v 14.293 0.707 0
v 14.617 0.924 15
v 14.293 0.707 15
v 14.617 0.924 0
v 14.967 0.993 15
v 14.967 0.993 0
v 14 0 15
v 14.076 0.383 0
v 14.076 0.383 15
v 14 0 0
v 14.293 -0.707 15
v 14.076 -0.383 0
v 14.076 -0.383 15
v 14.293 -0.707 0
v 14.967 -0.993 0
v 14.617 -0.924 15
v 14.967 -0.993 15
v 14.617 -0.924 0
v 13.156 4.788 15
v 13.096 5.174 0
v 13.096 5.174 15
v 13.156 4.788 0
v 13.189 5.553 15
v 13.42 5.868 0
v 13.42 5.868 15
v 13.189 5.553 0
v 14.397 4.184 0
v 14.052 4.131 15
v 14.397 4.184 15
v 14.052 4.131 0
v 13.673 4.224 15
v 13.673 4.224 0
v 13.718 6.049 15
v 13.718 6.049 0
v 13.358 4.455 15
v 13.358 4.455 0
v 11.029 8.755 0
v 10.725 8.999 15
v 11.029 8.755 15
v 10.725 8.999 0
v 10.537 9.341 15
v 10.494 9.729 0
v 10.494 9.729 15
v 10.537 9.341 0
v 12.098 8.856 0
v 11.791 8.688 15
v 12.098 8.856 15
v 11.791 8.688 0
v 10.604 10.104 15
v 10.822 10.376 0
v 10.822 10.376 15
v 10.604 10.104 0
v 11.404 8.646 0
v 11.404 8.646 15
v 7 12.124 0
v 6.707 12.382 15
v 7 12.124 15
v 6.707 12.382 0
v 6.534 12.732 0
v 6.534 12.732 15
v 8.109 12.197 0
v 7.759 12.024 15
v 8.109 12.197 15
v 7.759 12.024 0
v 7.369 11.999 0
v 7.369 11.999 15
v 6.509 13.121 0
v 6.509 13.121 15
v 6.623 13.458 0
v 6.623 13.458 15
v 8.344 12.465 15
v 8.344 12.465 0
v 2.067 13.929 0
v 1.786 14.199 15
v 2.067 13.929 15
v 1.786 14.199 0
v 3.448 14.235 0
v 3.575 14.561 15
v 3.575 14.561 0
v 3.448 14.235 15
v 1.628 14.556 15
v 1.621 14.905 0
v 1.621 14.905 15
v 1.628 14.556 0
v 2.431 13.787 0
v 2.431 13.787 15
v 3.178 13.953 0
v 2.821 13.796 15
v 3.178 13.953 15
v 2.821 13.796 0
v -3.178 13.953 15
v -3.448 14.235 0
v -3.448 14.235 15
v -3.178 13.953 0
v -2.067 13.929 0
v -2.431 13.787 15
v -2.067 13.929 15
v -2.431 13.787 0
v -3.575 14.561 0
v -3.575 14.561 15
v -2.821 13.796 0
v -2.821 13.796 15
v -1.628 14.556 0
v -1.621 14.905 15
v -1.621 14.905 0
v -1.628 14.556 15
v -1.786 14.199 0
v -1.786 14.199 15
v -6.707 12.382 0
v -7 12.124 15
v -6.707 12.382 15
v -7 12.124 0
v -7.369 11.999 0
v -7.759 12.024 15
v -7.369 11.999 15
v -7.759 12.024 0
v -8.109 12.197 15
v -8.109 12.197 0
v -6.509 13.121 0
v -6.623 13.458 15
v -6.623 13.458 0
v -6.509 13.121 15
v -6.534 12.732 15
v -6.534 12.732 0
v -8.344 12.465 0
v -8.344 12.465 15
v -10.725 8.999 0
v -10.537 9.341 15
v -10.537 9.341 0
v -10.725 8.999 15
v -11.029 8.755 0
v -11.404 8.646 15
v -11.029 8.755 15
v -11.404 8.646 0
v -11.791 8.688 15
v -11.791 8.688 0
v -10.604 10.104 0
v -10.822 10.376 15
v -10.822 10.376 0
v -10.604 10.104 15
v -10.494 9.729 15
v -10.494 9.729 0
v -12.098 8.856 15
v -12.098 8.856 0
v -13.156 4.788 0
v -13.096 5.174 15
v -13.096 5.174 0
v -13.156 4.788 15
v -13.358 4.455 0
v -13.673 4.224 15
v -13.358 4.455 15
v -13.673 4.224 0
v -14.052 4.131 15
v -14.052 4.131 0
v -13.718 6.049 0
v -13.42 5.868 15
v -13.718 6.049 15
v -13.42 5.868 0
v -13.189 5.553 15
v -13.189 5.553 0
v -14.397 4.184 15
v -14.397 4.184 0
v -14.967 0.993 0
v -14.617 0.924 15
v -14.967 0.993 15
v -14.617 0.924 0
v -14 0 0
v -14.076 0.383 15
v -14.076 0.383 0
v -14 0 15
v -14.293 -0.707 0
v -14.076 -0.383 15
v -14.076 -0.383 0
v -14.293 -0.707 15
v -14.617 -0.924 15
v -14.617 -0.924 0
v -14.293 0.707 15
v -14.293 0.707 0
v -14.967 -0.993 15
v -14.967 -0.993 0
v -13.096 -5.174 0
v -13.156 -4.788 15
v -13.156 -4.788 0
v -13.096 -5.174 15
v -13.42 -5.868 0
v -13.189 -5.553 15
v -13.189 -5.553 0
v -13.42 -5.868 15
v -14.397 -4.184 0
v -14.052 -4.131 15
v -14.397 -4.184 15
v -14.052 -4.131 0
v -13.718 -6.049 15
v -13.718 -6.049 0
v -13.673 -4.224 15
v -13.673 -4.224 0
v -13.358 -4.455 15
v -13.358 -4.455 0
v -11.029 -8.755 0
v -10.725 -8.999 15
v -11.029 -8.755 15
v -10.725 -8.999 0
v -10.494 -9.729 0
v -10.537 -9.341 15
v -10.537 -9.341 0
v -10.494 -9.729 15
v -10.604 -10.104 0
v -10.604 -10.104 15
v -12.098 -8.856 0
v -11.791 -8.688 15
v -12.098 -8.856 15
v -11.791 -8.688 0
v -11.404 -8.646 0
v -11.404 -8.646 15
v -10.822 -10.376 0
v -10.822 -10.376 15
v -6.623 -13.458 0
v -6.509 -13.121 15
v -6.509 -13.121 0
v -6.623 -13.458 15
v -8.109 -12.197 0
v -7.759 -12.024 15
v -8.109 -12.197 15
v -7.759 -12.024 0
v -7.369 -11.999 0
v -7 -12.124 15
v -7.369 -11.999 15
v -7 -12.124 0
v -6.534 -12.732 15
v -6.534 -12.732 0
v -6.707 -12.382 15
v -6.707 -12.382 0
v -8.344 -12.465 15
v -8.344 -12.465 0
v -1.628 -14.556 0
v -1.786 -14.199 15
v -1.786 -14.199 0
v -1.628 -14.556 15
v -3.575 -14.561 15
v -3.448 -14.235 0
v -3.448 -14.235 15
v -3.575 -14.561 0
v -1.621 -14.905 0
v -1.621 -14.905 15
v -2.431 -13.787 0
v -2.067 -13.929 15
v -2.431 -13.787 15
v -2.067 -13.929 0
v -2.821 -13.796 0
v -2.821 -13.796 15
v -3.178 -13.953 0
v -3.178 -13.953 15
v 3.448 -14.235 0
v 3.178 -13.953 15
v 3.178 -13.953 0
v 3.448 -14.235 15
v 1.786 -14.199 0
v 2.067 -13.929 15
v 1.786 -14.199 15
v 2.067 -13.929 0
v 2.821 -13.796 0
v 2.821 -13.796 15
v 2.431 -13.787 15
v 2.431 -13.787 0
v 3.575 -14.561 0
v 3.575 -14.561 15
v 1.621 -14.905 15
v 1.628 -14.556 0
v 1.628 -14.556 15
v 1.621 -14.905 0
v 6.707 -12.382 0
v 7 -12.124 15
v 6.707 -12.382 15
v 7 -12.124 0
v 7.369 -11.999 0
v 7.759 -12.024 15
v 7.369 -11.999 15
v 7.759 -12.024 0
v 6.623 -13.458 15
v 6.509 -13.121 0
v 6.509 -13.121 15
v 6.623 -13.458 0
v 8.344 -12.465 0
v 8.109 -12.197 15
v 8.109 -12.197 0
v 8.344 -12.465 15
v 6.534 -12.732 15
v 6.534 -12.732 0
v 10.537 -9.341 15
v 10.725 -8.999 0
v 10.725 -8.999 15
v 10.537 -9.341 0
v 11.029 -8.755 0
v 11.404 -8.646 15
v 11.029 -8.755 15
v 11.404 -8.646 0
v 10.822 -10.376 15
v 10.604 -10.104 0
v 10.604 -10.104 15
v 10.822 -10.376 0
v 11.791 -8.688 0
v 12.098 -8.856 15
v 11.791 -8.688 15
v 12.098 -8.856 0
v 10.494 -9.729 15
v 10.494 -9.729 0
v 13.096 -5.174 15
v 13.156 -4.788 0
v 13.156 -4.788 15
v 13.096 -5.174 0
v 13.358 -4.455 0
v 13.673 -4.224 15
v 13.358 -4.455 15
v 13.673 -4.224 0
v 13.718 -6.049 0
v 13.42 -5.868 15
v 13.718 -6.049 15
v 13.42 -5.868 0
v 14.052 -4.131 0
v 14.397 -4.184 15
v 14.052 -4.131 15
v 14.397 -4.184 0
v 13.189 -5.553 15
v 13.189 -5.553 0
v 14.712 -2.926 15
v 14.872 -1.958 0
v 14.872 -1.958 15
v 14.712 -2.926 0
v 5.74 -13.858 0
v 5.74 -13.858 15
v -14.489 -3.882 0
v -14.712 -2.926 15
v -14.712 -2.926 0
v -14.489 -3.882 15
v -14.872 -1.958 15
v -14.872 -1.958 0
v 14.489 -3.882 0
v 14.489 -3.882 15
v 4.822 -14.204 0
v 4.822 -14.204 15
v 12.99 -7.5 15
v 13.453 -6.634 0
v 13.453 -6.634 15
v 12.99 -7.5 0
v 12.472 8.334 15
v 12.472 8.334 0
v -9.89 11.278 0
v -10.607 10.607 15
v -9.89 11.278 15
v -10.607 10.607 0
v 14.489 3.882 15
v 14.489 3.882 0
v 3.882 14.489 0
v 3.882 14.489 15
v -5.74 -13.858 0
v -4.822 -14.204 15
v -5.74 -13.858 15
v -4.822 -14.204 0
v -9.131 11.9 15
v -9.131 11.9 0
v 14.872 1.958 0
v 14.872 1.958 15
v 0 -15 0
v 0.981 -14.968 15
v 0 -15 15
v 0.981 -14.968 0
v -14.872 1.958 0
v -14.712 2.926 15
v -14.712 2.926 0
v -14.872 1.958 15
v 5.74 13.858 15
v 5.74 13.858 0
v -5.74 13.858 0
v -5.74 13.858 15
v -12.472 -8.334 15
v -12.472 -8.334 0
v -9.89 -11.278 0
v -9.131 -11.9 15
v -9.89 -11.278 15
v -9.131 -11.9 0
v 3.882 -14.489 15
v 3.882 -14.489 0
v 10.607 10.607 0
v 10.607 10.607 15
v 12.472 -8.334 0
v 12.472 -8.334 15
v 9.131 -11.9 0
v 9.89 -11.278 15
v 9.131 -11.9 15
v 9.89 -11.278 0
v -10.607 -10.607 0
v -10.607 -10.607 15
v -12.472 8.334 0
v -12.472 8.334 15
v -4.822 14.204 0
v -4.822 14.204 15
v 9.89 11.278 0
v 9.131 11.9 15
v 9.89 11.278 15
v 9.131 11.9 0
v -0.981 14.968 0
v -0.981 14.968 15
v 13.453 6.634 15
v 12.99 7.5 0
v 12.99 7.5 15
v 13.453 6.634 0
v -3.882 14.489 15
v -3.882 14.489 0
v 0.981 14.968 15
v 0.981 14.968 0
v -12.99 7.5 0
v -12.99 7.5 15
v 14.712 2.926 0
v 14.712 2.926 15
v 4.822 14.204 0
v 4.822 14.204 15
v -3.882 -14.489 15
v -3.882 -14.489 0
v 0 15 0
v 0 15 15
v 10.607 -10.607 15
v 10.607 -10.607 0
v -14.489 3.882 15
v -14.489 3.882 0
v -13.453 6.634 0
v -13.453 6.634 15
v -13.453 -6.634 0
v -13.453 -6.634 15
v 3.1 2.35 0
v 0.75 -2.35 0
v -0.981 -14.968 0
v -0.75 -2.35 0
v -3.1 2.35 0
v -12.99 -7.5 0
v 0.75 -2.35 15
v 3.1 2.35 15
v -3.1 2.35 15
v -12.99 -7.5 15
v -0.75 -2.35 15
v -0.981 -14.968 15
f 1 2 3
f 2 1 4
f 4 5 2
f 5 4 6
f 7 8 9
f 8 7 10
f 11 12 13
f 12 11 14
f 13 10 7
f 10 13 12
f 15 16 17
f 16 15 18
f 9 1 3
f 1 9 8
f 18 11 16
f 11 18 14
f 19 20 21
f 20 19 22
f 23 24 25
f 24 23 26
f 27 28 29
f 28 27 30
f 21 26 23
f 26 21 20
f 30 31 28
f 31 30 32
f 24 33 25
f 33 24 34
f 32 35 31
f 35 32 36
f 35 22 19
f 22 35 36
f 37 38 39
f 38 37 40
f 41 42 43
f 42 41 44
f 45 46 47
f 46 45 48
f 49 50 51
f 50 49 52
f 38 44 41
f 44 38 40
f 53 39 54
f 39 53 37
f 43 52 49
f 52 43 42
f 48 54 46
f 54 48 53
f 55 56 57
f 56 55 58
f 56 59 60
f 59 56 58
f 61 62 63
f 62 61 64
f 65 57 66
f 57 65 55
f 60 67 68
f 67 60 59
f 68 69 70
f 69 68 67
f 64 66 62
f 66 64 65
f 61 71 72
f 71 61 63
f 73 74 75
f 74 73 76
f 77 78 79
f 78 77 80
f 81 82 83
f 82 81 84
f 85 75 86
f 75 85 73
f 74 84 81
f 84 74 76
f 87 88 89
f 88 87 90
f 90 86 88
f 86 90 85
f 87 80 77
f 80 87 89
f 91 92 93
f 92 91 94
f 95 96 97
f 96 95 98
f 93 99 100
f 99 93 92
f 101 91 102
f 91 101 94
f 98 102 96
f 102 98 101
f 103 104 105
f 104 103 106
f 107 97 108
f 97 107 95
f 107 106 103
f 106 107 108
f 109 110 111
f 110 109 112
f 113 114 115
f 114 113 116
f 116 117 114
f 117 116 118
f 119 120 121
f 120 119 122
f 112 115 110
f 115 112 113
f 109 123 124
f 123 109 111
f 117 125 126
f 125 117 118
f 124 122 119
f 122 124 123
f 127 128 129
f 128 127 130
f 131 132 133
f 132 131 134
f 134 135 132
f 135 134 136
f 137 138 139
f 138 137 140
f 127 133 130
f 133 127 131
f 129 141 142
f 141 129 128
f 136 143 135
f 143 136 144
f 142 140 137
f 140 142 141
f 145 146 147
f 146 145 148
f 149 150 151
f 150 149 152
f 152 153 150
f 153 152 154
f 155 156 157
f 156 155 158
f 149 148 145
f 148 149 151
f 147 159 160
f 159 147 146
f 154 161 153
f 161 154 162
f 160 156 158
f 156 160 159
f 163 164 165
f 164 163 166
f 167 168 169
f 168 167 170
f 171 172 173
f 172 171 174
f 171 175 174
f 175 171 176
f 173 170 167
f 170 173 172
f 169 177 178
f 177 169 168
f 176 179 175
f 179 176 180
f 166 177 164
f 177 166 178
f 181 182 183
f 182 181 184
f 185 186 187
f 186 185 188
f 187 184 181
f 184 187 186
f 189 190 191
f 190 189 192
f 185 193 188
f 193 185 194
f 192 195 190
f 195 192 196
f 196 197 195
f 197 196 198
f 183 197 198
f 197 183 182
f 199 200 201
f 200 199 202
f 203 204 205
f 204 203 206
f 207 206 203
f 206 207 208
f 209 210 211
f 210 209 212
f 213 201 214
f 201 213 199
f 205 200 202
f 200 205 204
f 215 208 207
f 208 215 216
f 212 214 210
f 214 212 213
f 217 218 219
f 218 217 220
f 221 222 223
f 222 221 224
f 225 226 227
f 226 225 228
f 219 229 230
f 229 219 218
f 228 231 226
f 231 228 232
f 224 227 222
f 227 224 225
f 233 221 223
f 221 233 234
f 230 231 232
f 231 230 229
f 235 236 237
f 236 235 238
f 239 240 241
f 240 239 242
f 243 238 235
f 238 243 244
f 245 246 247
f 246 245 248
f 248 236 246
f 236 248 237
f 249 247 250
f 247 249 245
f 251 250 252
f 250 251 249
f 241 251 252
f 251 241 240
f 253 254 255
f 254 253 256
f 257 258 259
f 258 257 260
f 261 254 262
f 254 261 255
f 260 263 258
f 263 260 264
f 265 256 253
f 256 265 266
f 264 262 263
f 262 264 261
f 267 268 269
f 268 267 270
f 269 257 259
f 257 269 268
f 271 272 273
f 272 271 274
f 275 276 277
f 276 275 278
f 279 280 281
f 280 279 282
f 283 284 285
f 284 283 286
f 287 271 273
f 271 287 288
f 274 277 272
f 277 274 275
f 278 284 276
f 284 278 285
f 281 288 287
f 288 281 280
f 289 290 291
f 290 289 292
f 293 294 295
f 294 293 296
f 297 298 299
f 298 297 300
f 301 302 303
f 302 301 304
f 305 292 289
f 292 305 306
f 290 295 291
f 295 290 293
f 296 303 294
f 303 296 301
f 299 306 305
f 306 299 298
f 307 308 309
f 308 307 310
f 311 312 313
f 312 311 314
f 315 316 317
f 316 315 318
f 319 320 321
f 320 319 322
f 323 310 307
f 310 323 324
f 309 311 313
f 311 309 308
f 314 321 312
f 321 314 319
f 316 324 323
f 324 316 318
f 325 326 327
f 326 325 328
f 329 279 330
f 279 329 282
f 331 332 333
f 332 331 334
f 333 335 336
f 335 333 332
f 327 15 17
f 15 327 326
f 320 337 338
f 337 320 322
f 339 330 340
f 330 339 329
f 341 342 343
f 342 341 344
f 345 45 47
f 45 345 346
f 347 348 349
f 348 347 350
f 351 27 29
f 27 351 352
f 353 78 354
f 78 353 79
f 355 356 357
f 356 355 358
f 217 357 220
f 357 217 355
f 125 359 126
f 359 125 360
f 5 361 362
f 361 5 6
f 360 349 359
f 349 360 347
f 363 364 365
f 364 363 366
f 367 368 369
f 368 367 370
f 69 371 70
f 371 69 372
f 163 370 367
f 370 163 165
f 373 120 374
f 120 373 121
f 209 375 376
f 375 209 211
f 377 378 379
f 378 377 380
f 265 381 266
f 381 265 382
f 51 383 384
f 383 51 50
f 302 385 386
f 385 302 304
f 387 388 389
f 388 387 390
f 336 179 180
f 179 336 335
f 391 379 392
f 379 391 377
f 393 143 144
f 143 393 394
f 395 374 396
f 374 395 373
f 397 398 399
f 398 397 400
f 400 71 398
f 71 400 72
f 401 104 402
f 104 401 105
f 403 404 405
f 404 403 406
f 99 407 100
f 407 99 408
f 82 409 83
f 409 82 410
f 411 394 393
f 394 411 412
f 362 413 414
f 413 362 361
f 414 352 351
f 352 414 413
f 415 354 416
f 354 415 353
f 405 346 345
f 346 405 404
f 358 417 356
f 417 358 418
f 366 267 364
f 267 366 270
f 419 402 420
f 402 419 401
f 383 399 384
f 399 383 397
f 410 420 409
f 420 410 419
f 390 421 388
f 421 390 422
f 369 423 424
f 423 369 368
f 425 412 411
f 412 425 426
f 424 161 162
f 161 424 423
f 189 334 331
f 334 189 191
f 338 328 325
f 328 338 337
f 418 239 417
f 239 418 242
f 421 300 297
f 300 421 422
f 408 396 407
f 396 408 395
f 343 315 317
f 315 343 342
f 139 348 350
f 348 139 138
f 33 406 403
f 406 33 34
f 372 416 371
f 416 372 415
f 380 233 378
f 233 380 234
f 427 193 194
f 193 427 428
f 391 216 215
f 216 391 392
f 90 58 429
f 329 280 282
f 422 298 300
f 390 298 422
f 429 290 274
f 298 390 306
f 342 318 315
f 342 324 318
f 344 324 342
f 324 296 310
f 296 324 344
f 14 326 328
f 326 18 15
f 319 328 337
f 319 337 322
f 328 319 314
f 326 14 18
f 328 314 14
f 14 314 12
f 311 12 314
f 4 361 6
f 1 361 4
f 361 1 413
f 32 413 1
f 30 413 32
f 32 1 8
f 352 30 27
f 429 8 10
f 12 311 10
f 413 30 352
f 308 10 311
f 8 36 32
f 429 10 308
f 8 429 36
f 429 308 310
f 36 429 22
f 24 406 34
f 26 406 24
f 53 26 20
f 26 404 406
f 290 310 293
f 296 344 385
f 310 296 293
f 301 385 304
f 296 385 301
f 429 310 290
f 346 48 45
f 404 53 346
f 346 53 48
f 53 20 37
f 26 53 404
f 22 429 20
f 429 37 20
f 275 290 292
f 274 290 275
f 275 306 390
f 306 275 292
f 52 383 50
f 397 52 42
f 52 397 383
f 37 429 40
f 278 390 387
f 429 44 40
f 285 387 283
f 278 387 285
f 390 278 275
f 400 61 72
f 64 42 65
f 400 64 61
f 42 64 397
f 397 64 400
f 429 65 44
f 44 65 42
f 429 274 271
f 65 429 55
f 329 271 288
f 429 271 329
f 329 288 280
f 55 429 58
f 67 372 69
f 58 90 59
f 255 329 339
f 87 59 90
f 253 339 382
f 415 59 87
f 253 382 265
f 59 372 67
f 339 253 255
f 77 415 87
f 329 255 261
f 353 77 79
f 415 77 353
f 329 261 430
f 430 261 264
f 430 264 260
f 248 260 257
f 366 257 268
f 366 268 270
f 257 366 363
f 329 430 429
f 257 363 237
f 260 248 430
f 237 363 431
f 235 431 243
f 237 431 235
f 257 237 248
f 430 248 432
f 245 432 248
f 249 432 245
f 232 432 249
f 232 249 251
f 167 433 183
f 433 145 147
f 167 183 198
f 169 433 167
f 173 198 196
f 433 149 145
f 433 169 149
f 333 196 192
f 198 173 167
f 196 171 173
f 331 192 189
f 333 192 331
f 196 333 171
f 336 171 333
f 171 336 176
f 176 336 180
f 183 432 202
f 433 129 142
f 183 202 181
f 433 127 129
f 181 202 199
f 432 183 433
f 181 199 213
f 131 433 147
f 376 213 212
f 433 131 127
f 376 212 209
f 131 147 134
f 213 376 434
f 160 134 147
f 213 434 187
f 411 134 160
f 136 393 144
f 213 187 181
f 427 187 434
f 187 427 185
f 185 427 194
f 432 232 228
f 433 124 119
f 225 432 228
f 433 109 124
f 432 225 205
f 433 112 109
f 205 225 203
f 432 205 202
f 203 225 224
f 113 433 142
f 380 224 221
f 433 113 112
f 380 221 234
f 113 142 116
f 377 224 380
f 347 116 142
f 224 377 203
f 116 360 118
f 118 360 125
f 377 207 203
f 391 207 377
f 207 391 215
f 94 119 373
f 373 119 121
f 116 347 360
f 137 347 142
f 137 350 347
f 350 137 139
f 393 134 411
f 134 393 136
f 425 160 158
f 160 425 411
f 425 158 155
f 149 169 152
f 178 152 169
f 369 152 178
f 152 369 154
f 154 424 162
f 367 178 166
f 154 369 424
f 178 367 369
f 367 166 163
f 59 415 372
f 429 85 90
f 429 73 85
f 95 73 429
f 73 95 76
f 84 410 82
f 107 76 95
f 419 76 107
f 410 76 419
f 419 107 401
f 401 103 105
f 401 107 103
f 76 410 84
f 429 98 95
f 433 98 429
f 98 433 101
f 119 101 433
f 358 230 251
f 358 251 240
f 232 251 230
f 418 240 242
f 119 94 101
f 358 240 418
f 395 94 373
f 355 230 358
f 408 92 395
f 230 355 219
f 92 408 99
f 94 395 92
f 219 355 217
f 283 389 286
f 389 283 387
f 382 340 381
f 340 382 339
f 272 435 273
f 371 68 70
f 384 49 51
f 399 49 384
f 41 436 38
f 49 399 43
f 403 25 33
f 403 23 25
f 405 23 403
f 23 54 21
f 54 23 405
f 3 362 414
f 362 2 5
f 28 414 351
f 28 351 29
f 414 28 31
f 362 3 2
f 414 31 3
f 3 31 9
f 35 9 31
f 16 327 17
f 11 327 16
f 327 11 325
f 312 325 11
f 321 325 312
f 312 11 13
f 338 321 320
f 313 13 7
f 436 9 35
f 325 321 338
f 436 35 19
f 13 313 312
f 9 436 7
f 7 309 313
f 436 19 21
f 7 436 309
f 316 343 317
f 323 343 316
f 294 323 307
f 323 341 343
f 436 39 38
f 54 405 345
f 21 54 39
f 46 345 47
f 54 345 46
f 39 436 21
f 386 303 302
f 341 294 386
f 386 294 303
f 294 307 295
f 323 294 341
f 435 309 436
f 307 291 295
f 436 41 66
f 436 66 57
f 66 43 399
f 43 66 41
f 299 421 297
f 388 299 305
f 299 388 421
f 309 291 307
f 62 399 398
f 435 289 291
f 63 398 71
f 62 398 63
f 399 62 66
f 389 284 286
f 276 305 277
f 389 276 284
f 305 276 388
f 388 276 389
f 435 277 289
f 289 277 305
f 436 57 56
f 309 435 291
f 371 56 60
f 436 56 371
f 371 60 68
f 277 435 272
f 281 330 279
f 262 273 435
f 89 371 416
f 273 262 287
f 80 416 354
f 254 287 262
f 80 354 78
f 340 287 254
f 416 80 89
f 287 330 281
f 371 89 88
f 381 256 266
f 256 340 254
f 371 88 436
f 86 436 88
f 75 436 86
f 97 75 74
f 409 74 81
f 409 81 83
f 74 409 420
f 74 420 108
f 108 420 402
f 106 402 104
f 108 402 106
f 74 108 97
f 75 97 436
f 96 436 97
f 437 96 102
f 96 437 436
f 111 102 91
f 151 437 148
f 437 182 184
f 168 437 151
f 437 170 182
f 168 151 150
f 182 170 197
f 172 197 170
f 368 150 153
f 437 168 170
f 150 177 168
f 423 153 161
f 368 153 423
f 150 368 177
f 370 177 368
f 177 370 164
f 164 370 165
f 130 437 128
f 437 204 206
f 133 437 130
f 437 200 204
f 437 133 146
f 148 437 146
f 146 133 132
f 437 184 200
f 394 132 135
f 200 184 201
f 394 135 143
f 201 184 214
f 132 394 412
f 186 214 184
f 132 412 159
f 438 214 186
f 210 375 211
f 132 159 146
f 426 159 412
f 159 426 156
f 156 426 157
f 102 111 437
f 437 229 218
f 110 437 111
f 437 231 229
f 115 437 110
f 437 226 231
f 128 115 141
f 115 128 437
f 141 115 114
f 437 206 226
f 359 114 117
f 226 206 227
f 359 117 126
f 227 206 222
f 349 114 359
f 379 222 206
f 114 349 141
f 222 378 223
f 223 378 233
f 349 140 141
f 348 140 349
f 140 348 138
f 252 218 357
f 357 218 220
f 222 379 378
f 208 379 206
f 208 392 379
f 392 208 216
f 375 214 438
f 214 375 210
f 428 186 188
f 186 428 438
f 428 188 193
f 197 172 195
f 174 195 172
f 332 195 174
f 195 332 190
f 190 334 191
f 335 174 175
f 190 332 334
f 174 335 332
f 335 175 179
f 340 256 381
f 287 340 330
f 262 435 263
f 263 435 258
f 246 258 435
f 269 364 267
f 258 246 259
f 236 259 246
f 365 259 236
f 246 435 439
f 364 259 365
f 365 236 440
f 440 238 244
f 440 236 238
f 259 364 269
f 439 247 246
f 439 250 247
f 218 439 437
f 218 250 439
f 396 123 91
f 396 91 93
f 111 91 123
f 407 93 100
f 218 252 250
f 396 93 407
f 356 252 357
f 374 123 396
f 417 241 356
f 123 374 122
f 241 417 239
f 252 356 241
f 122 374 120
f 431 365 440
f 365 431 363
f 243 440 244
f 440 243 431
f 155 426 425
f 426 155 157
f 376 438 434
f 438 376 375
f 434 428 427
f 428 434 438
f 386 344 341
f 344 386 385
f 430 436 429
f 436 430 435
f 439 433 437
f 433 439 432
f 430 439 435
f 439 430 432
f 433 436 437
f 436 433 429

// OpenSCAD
// Replacement knob for hotplate stirrer (D-shaft 6 mm)
// Print orientation: bottom face (with D-bore) on the bed, z = 0

// ---------------- Parameters ----------------
knob_d        = 30;    // knob outer diameter
knob_h        = 15;    // knob height
shaft_d       = 6.2;   // D-bore diameter
shaft_flat    = 4.7;   // distance from D-flat to opposite side
groove_count  = 18;    // number of vertical grip grooves
groove_d      = 2;     // groove diameter (half-cylinder)
pointer_w     = 1.5;   // pointer groove width
pointer_d     = 1;     // pointer groove depth
eps           = 0.5;   // overcut for clean differences

$fn = 96;

// ---------------- Derived ----------------
// Half-width of D on the flat side (x < 0), so the flat spans x = -flat..0
flat_half = (shaft_d - shaft_flat) / 2;

// ---------------- Model ----------------
difference() {
    // Main body
    cylinder(d = knob_d, h = knob_h);

    // D-shaped blind bore from bottom face
    translate([0, 0, -eps])
        linear_extrude(height = knob_h + 2 * eps)
            polygon([
                [-flat_half, -shaft_flat / 2],
                [ flat_half, -shaft_flat / 2],
                [ shaft_d / 2, shaft_flat / 2],
                [- shaft_d / 2, shaft_flat / 2]
            ]);

    // Vertical grip grooves along full height
    for (i = [0 : groove_count - 1])
        rotate([0, 0, i * 360 / groove_count])
            translate([knob_d / 2, 0, -eps])
                cylinder(d = groove_d, h = knob_h + 2 * eps, $fn = 16);

    // Pointer groove on top face, centred on +x axis
    translate([0, 0, knob_h - pointer_d])
        rotate([90, 0, 0])
            linear_extrude(height = pointer_d + eps)
                polygon([
                    [-pointer_w / 2, 0],
                    [ pointer_w / 2, 0],
                    [ pointer_w / 2, -pointer_w / 2]
                ]);
}
